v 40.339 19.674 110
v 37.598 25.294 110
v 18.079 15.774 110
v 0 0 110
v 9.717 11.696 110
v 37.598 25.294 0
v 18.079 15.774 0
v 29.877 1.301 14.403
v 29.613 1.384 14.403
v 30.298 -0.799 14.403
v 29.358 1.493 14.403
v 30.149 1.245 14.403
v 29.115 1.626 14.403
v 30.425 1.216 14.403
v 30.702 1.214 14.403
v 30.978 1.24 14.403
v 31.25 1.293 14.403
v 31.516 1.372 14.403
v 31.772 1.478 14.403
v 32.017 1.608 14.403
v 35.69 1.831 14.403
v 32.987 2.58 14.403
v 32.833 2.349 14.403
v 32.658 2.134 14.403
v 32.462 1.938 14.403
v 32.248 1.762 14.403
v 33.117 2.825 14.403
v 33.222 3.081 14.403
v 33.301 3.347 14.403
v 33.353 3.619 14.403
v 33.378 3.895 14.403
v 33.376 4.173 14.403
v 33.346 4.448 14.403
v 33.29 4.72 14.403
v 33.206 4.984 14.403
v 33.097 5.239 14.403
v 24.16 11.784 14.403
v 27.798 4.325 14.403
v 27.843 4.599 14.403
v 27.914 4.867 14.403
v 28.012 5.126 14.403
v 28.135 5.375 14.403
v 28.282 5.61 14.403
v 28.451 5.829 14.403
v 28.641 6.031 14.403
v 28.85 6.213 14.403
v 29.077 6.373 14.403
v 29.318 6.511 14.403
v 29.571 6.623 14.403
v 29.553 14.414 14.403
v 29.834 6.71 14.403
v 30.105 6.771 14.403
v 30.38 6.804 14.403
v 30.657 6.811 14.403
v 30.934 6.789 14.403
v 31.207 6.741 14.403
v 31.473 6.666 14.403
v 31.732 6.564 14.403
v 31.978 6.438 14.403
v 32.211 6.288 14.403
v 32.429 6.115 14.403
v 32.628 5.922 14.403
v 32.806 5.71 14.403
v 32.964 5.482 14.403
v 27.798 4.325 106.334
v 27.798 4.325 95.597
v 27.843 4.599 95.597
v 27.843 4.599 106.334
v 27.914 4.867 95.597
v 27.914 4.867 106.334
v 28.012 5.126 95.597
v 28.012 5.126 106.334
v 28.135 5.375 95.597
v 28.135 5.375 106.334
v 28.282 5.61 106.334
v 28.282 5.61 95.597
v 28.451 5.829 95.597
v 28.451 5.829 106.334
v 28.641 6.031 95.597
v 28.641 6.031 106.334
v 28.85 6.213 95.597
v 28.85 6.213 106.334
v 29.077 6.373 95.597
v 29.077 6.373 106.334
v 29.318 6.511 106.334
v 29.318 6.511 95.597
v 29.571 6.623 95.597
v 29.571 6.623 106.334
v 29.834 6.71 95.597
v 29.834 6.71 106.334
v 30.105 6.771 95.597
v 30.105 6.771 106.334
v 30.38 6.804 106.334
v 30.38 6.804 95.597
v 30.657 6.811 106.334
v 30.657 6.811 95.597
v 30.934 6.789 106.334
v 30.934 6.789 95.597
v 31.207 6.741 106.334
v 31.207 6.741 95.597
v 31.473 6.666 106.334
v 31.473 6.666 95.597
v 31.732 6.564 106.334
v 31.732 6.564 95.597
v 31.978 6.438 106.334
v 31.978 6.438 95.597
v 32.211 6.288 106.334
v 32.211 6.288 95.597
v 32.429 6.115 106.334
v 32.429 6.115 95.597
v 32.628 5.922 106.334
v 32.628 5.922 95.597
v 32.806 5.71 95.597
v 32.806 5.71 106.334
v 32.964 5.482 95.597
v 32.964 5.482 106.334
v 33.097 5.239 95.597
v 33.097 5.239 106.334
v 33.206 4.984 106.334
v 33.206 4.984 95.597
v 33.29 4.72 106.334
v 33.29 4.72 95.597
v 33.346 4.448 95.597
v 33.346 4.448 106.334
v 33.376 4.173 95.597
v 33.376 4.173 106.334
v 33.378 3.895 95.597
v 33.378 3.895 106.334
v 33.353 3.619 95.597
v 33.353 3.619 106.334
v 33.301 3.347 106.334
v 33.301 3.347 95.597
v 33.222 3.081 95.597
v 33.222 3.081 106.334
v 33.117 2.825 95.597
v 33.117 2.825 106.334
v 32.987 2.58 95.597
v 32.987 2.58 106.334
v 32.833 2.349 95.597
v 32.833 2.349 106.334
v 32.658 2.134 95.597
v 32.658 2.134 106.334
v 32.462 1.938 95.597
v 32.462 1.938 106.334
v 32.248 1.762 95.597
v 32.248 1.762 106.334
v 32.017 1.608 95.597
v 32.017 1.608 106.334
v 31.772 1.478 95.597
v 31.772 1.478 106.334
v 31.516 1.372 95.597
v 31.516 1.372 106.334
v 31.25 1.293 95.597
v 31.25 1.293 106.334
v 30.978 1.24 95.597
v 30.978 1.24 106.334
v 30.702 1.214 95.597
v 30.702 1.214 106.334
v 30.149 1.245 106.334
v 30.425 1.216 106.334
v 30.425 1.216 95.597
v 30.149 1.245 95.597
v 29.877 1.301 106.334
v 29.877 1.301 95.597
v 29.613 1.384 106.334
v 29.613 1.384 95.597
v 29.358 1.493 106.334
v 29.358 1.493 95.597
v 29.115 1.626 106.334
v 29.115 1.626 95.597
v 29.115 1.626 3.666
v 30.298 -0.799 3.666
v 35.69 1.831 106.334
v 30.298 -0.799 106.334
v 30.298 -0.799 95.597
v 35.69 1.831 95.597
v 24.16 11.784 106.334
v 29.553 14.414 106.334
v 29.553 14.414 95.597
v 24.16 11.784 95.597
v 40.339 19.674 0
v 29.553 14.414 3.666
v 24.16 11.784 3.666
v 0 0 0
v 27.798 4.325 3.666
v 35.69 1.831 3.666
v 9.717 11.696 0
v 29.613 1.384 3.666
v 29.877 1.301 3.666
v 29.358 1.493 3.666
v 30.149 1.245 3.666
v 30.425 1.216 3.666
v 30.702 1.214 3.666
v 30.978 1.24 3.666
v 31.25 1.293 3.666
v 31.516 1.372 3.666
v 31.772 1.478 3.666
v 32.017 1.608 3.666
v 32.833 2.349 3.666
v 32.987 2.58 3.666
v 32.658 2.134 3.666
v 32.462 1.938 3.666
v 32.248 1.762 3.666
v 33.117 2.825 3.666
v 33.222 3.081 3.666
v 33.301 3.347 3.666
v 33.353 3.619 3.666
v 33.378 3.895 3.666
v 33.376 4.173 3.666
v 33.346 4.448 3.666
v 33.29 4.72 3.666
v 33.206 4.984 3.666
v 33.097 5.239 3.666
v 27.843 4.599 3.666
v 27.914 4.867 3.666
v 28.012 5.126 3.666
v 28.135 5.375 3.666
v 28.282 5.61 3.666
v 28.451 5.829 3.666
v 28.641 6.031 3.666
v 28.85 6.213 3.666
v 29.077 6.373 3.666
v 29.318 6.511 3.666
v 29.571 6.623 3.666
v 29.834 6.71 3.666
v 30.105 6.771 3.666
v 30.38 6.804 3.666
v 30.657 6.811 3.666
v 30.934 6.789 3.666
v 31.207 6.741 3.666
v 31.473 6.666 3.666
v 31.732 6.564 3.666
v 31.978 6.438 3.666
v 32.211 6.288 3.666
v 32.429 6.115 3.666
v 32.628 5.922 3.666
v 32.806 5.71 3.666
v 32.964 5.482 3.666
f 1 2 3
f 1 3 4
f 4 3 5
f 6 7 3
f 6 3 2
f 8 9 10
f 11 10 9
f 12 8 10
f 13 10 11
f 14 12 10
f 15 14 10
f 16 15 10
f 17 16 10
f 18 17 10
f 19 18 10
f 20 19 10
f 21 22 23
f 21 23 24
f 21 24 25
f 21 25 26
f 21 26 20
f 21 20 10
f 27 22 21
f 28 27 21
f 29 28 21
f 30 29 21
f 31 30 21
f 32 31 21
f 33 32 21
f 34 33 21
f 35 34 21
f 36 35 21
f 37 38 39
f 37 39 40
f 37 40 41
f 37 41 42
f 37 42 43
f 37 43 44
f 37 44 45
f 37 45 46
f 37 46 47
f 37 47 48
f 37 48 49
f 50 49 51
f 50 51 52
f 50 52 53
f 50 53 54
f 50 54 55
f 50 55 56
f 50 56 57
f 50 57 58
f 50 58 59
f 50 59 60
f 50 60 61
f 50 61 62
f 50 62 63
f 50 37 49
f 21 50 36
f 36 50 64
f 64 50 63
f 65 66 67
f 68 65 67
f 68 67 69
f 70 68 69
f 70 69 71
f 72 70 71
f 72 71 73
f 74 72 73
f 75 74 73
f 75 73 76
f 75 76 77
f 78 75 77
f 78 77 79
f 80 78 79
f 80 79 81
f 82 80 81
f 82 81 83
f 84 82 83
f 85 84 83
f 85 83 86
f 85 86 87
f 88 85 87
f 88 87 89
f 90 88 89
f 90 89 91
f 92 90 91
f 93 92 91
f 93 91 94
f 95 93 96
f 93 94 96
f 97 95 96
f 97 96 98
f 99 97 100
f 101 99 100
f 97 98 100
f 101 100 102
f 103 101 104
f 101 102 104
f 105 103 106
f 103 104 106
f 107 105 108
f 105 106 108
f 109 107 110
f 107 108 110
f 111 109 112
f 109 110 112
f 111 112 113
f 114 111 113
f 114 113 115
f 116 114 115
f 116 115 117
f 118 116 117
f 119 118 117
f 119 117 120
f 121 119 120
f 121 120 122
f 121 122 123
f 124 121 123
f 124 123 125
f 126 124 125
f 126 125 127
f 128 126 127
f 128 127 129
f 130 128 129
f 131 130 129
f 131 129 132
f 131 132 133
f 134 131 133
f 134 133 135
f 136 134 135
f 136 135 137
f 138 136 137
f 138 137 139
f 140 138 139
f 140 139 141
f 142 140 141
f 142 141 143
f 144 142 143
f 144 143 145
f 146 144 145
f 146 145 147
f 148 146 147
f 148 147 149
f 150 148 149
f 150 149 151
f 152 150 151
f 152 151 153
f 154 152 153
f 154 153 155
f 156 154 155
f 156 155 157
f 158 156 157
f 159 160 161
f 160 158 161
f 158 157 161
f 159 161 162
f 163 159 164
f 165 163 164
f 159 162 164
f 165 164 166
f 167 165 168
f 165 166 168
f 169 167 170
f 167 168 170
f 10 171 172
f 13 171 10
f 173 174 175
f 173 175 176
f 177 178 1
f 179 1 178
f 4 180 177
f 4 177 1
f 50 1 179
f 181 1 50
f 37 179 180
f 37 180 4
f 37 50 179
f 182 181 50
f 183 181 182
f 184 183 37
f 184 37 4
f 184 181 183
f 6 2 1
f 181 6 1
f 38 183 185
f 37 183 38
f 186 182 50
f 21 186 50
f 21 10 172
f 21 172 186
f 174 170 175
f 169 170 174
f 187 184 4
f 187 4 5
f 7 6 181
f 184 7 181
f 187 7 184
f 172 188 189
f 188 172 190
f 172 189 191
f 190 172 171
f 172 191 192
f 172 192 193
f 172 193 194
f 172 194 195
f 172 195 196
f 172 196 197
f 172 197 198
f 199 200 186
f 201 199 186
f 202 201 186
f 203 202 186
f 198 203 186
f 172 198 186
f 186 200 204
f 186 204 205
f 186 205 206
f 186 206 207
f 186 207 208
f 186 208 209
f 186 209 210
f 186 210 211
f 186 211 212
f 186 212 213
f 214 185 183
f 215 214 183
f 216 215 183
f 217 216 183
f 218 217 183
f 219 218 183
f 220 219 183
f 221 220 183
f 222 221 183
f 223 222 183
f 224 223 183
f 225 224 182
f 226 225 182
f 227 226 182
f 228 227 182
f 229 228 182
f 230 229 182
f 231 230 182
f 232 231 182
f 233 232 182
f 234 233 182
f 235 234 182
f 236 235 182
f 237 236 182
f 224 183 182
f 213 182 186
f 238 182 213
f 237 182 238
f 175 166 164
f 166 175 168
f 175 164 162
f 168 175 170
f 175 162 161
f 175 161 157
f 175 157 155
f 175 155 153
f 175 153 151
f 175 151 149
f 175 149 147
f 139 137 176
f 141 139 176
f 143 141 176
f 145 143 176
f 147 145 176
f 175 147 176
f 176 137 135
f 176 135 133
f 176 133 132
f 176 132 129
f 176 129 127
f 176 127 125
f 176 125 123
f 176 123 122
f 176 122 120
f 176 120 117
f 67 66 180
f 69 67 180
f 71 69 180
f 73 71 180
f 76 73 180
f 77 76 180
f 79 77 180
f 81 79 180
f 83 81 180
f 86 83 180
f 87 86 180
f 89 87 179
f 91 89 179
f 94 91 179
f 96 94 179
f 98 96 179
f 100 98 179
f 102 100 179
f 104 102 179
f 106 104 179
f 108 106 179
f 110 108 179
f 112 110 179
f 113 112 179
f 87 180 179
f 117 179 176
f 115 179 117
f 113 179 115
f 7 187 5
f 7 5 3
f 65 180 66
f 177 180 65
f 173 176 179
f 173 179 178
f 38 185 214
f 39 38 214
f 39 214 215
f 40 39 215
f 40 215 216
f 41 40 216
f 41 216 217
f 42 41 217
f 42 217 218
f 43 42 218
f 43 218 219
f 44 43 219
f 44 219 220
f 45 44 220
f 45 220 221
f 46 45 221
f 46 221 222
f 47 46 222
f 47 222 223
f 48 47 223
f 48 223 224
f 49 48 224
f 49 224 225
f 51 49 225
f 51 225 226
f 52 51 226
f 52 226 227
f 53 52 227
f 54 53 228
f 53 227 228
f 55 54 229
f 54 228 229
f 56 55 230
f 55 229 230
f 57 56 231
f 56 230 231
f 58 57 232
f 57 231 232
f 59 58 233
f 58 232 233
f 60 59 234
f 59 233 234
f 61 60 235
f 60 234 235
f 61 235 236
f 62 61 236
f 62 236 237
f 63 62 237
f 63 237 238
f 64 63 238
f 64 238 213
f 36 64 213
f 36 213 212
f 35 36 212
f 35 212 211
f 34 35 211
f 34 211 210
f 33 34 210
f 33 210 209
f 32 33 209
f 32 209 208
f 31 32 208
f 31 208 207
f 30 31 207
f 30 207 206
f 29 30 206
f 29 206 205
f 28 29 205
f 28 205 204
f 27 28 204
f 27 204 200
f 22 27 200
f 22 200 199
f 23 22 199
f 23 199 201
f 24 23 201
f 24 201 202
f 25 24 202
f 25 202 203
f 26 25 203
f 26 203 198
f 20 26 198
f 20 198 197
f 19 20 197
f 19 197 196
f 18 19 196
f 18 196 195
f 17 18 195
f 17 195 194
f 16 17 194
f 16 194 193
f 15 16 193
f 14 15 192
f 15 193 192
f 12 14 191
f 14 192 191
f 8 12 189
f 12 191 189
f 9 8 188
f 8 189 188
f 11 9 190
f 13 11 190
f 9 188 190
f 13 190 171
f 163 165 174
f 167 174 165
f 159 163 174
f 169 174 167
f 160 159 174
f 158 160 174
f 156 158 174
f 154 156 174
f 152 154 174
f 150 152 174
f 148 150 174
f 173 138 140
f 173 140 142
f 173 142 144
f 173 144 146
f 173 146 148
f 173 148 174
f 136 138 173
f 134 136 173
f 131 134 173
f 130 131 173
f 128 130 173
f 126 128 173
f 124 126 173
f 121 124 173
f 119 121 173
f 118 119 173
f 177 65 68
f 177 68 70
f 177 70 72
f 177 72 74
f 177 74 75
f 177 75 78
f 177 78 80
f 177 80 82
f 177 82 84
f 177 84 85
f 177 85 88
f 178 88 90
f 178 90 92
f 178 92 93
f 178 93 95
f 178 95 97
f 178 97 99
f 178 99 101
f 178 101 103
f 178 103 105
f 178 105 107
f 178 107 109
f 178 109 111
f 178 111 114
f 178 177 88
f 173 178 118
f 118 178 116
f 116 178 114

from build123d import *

# Parameters (mm, degrees)
BOSS_EXTRUDE1_DEPTH = 110
SKETCH3_W           = 6
SKETCH3_H           = 10.73706506
BOSS_EXTRUDE3_DEPTH = 14
SKETCH18_R          = 2.8
CUT_EXTRUDE4_DEPTH  = 117.507131621


with BuildPart() as part:
    # Sketch1 → Boss-Extrude1 (new body)
    with BuildSketch(Plane.XY):
        Polygon((0, 0), (9.717159864, 11.695735532), (18.078758039, 15.773959455), (37.597840156, 25.294051902), (40.338683398, 19.674490473), align=None)
    extrude(amount=BOSS_EXTRUDE1_DEPTH)

    # Sketch3 → Boss-Extrude3 (add)
    with BuildSketch(Plane(origin=(0, 0, 0), x_dir=(0.8987940462991665, 0.43837114678907857, 0), z_dir=(0.43837114678907857, -0.8987940462991665, 0))):
        with Locations((29.880897425, 100.965437953)):
            Rectangle(SKETCH3_W, SKETCH3_H)
        with Locations((29.880897425, 9.034562047)):
            Rectangle(SKETCH3_W, SKETCH3_H)
    extrude(amount=BOSS_EXTRUDE3_DEPTH)

    # Sketch18 → Cut-Extrude4 (cut, through all)
    with BuildSketch(Plane(origin=(0, 0, 3.666029517), x_dir=(-1, 0, 0), z_dir=(0, 0, -1))):
        with Locations((-30.580685329, 4.011697799)):
            Circle(SKETCH18_R)
    extrude(amount=-CUT_EXTRUDE4_DEPTH, mode=Mode.SUBTRACT)


solid = part.part
